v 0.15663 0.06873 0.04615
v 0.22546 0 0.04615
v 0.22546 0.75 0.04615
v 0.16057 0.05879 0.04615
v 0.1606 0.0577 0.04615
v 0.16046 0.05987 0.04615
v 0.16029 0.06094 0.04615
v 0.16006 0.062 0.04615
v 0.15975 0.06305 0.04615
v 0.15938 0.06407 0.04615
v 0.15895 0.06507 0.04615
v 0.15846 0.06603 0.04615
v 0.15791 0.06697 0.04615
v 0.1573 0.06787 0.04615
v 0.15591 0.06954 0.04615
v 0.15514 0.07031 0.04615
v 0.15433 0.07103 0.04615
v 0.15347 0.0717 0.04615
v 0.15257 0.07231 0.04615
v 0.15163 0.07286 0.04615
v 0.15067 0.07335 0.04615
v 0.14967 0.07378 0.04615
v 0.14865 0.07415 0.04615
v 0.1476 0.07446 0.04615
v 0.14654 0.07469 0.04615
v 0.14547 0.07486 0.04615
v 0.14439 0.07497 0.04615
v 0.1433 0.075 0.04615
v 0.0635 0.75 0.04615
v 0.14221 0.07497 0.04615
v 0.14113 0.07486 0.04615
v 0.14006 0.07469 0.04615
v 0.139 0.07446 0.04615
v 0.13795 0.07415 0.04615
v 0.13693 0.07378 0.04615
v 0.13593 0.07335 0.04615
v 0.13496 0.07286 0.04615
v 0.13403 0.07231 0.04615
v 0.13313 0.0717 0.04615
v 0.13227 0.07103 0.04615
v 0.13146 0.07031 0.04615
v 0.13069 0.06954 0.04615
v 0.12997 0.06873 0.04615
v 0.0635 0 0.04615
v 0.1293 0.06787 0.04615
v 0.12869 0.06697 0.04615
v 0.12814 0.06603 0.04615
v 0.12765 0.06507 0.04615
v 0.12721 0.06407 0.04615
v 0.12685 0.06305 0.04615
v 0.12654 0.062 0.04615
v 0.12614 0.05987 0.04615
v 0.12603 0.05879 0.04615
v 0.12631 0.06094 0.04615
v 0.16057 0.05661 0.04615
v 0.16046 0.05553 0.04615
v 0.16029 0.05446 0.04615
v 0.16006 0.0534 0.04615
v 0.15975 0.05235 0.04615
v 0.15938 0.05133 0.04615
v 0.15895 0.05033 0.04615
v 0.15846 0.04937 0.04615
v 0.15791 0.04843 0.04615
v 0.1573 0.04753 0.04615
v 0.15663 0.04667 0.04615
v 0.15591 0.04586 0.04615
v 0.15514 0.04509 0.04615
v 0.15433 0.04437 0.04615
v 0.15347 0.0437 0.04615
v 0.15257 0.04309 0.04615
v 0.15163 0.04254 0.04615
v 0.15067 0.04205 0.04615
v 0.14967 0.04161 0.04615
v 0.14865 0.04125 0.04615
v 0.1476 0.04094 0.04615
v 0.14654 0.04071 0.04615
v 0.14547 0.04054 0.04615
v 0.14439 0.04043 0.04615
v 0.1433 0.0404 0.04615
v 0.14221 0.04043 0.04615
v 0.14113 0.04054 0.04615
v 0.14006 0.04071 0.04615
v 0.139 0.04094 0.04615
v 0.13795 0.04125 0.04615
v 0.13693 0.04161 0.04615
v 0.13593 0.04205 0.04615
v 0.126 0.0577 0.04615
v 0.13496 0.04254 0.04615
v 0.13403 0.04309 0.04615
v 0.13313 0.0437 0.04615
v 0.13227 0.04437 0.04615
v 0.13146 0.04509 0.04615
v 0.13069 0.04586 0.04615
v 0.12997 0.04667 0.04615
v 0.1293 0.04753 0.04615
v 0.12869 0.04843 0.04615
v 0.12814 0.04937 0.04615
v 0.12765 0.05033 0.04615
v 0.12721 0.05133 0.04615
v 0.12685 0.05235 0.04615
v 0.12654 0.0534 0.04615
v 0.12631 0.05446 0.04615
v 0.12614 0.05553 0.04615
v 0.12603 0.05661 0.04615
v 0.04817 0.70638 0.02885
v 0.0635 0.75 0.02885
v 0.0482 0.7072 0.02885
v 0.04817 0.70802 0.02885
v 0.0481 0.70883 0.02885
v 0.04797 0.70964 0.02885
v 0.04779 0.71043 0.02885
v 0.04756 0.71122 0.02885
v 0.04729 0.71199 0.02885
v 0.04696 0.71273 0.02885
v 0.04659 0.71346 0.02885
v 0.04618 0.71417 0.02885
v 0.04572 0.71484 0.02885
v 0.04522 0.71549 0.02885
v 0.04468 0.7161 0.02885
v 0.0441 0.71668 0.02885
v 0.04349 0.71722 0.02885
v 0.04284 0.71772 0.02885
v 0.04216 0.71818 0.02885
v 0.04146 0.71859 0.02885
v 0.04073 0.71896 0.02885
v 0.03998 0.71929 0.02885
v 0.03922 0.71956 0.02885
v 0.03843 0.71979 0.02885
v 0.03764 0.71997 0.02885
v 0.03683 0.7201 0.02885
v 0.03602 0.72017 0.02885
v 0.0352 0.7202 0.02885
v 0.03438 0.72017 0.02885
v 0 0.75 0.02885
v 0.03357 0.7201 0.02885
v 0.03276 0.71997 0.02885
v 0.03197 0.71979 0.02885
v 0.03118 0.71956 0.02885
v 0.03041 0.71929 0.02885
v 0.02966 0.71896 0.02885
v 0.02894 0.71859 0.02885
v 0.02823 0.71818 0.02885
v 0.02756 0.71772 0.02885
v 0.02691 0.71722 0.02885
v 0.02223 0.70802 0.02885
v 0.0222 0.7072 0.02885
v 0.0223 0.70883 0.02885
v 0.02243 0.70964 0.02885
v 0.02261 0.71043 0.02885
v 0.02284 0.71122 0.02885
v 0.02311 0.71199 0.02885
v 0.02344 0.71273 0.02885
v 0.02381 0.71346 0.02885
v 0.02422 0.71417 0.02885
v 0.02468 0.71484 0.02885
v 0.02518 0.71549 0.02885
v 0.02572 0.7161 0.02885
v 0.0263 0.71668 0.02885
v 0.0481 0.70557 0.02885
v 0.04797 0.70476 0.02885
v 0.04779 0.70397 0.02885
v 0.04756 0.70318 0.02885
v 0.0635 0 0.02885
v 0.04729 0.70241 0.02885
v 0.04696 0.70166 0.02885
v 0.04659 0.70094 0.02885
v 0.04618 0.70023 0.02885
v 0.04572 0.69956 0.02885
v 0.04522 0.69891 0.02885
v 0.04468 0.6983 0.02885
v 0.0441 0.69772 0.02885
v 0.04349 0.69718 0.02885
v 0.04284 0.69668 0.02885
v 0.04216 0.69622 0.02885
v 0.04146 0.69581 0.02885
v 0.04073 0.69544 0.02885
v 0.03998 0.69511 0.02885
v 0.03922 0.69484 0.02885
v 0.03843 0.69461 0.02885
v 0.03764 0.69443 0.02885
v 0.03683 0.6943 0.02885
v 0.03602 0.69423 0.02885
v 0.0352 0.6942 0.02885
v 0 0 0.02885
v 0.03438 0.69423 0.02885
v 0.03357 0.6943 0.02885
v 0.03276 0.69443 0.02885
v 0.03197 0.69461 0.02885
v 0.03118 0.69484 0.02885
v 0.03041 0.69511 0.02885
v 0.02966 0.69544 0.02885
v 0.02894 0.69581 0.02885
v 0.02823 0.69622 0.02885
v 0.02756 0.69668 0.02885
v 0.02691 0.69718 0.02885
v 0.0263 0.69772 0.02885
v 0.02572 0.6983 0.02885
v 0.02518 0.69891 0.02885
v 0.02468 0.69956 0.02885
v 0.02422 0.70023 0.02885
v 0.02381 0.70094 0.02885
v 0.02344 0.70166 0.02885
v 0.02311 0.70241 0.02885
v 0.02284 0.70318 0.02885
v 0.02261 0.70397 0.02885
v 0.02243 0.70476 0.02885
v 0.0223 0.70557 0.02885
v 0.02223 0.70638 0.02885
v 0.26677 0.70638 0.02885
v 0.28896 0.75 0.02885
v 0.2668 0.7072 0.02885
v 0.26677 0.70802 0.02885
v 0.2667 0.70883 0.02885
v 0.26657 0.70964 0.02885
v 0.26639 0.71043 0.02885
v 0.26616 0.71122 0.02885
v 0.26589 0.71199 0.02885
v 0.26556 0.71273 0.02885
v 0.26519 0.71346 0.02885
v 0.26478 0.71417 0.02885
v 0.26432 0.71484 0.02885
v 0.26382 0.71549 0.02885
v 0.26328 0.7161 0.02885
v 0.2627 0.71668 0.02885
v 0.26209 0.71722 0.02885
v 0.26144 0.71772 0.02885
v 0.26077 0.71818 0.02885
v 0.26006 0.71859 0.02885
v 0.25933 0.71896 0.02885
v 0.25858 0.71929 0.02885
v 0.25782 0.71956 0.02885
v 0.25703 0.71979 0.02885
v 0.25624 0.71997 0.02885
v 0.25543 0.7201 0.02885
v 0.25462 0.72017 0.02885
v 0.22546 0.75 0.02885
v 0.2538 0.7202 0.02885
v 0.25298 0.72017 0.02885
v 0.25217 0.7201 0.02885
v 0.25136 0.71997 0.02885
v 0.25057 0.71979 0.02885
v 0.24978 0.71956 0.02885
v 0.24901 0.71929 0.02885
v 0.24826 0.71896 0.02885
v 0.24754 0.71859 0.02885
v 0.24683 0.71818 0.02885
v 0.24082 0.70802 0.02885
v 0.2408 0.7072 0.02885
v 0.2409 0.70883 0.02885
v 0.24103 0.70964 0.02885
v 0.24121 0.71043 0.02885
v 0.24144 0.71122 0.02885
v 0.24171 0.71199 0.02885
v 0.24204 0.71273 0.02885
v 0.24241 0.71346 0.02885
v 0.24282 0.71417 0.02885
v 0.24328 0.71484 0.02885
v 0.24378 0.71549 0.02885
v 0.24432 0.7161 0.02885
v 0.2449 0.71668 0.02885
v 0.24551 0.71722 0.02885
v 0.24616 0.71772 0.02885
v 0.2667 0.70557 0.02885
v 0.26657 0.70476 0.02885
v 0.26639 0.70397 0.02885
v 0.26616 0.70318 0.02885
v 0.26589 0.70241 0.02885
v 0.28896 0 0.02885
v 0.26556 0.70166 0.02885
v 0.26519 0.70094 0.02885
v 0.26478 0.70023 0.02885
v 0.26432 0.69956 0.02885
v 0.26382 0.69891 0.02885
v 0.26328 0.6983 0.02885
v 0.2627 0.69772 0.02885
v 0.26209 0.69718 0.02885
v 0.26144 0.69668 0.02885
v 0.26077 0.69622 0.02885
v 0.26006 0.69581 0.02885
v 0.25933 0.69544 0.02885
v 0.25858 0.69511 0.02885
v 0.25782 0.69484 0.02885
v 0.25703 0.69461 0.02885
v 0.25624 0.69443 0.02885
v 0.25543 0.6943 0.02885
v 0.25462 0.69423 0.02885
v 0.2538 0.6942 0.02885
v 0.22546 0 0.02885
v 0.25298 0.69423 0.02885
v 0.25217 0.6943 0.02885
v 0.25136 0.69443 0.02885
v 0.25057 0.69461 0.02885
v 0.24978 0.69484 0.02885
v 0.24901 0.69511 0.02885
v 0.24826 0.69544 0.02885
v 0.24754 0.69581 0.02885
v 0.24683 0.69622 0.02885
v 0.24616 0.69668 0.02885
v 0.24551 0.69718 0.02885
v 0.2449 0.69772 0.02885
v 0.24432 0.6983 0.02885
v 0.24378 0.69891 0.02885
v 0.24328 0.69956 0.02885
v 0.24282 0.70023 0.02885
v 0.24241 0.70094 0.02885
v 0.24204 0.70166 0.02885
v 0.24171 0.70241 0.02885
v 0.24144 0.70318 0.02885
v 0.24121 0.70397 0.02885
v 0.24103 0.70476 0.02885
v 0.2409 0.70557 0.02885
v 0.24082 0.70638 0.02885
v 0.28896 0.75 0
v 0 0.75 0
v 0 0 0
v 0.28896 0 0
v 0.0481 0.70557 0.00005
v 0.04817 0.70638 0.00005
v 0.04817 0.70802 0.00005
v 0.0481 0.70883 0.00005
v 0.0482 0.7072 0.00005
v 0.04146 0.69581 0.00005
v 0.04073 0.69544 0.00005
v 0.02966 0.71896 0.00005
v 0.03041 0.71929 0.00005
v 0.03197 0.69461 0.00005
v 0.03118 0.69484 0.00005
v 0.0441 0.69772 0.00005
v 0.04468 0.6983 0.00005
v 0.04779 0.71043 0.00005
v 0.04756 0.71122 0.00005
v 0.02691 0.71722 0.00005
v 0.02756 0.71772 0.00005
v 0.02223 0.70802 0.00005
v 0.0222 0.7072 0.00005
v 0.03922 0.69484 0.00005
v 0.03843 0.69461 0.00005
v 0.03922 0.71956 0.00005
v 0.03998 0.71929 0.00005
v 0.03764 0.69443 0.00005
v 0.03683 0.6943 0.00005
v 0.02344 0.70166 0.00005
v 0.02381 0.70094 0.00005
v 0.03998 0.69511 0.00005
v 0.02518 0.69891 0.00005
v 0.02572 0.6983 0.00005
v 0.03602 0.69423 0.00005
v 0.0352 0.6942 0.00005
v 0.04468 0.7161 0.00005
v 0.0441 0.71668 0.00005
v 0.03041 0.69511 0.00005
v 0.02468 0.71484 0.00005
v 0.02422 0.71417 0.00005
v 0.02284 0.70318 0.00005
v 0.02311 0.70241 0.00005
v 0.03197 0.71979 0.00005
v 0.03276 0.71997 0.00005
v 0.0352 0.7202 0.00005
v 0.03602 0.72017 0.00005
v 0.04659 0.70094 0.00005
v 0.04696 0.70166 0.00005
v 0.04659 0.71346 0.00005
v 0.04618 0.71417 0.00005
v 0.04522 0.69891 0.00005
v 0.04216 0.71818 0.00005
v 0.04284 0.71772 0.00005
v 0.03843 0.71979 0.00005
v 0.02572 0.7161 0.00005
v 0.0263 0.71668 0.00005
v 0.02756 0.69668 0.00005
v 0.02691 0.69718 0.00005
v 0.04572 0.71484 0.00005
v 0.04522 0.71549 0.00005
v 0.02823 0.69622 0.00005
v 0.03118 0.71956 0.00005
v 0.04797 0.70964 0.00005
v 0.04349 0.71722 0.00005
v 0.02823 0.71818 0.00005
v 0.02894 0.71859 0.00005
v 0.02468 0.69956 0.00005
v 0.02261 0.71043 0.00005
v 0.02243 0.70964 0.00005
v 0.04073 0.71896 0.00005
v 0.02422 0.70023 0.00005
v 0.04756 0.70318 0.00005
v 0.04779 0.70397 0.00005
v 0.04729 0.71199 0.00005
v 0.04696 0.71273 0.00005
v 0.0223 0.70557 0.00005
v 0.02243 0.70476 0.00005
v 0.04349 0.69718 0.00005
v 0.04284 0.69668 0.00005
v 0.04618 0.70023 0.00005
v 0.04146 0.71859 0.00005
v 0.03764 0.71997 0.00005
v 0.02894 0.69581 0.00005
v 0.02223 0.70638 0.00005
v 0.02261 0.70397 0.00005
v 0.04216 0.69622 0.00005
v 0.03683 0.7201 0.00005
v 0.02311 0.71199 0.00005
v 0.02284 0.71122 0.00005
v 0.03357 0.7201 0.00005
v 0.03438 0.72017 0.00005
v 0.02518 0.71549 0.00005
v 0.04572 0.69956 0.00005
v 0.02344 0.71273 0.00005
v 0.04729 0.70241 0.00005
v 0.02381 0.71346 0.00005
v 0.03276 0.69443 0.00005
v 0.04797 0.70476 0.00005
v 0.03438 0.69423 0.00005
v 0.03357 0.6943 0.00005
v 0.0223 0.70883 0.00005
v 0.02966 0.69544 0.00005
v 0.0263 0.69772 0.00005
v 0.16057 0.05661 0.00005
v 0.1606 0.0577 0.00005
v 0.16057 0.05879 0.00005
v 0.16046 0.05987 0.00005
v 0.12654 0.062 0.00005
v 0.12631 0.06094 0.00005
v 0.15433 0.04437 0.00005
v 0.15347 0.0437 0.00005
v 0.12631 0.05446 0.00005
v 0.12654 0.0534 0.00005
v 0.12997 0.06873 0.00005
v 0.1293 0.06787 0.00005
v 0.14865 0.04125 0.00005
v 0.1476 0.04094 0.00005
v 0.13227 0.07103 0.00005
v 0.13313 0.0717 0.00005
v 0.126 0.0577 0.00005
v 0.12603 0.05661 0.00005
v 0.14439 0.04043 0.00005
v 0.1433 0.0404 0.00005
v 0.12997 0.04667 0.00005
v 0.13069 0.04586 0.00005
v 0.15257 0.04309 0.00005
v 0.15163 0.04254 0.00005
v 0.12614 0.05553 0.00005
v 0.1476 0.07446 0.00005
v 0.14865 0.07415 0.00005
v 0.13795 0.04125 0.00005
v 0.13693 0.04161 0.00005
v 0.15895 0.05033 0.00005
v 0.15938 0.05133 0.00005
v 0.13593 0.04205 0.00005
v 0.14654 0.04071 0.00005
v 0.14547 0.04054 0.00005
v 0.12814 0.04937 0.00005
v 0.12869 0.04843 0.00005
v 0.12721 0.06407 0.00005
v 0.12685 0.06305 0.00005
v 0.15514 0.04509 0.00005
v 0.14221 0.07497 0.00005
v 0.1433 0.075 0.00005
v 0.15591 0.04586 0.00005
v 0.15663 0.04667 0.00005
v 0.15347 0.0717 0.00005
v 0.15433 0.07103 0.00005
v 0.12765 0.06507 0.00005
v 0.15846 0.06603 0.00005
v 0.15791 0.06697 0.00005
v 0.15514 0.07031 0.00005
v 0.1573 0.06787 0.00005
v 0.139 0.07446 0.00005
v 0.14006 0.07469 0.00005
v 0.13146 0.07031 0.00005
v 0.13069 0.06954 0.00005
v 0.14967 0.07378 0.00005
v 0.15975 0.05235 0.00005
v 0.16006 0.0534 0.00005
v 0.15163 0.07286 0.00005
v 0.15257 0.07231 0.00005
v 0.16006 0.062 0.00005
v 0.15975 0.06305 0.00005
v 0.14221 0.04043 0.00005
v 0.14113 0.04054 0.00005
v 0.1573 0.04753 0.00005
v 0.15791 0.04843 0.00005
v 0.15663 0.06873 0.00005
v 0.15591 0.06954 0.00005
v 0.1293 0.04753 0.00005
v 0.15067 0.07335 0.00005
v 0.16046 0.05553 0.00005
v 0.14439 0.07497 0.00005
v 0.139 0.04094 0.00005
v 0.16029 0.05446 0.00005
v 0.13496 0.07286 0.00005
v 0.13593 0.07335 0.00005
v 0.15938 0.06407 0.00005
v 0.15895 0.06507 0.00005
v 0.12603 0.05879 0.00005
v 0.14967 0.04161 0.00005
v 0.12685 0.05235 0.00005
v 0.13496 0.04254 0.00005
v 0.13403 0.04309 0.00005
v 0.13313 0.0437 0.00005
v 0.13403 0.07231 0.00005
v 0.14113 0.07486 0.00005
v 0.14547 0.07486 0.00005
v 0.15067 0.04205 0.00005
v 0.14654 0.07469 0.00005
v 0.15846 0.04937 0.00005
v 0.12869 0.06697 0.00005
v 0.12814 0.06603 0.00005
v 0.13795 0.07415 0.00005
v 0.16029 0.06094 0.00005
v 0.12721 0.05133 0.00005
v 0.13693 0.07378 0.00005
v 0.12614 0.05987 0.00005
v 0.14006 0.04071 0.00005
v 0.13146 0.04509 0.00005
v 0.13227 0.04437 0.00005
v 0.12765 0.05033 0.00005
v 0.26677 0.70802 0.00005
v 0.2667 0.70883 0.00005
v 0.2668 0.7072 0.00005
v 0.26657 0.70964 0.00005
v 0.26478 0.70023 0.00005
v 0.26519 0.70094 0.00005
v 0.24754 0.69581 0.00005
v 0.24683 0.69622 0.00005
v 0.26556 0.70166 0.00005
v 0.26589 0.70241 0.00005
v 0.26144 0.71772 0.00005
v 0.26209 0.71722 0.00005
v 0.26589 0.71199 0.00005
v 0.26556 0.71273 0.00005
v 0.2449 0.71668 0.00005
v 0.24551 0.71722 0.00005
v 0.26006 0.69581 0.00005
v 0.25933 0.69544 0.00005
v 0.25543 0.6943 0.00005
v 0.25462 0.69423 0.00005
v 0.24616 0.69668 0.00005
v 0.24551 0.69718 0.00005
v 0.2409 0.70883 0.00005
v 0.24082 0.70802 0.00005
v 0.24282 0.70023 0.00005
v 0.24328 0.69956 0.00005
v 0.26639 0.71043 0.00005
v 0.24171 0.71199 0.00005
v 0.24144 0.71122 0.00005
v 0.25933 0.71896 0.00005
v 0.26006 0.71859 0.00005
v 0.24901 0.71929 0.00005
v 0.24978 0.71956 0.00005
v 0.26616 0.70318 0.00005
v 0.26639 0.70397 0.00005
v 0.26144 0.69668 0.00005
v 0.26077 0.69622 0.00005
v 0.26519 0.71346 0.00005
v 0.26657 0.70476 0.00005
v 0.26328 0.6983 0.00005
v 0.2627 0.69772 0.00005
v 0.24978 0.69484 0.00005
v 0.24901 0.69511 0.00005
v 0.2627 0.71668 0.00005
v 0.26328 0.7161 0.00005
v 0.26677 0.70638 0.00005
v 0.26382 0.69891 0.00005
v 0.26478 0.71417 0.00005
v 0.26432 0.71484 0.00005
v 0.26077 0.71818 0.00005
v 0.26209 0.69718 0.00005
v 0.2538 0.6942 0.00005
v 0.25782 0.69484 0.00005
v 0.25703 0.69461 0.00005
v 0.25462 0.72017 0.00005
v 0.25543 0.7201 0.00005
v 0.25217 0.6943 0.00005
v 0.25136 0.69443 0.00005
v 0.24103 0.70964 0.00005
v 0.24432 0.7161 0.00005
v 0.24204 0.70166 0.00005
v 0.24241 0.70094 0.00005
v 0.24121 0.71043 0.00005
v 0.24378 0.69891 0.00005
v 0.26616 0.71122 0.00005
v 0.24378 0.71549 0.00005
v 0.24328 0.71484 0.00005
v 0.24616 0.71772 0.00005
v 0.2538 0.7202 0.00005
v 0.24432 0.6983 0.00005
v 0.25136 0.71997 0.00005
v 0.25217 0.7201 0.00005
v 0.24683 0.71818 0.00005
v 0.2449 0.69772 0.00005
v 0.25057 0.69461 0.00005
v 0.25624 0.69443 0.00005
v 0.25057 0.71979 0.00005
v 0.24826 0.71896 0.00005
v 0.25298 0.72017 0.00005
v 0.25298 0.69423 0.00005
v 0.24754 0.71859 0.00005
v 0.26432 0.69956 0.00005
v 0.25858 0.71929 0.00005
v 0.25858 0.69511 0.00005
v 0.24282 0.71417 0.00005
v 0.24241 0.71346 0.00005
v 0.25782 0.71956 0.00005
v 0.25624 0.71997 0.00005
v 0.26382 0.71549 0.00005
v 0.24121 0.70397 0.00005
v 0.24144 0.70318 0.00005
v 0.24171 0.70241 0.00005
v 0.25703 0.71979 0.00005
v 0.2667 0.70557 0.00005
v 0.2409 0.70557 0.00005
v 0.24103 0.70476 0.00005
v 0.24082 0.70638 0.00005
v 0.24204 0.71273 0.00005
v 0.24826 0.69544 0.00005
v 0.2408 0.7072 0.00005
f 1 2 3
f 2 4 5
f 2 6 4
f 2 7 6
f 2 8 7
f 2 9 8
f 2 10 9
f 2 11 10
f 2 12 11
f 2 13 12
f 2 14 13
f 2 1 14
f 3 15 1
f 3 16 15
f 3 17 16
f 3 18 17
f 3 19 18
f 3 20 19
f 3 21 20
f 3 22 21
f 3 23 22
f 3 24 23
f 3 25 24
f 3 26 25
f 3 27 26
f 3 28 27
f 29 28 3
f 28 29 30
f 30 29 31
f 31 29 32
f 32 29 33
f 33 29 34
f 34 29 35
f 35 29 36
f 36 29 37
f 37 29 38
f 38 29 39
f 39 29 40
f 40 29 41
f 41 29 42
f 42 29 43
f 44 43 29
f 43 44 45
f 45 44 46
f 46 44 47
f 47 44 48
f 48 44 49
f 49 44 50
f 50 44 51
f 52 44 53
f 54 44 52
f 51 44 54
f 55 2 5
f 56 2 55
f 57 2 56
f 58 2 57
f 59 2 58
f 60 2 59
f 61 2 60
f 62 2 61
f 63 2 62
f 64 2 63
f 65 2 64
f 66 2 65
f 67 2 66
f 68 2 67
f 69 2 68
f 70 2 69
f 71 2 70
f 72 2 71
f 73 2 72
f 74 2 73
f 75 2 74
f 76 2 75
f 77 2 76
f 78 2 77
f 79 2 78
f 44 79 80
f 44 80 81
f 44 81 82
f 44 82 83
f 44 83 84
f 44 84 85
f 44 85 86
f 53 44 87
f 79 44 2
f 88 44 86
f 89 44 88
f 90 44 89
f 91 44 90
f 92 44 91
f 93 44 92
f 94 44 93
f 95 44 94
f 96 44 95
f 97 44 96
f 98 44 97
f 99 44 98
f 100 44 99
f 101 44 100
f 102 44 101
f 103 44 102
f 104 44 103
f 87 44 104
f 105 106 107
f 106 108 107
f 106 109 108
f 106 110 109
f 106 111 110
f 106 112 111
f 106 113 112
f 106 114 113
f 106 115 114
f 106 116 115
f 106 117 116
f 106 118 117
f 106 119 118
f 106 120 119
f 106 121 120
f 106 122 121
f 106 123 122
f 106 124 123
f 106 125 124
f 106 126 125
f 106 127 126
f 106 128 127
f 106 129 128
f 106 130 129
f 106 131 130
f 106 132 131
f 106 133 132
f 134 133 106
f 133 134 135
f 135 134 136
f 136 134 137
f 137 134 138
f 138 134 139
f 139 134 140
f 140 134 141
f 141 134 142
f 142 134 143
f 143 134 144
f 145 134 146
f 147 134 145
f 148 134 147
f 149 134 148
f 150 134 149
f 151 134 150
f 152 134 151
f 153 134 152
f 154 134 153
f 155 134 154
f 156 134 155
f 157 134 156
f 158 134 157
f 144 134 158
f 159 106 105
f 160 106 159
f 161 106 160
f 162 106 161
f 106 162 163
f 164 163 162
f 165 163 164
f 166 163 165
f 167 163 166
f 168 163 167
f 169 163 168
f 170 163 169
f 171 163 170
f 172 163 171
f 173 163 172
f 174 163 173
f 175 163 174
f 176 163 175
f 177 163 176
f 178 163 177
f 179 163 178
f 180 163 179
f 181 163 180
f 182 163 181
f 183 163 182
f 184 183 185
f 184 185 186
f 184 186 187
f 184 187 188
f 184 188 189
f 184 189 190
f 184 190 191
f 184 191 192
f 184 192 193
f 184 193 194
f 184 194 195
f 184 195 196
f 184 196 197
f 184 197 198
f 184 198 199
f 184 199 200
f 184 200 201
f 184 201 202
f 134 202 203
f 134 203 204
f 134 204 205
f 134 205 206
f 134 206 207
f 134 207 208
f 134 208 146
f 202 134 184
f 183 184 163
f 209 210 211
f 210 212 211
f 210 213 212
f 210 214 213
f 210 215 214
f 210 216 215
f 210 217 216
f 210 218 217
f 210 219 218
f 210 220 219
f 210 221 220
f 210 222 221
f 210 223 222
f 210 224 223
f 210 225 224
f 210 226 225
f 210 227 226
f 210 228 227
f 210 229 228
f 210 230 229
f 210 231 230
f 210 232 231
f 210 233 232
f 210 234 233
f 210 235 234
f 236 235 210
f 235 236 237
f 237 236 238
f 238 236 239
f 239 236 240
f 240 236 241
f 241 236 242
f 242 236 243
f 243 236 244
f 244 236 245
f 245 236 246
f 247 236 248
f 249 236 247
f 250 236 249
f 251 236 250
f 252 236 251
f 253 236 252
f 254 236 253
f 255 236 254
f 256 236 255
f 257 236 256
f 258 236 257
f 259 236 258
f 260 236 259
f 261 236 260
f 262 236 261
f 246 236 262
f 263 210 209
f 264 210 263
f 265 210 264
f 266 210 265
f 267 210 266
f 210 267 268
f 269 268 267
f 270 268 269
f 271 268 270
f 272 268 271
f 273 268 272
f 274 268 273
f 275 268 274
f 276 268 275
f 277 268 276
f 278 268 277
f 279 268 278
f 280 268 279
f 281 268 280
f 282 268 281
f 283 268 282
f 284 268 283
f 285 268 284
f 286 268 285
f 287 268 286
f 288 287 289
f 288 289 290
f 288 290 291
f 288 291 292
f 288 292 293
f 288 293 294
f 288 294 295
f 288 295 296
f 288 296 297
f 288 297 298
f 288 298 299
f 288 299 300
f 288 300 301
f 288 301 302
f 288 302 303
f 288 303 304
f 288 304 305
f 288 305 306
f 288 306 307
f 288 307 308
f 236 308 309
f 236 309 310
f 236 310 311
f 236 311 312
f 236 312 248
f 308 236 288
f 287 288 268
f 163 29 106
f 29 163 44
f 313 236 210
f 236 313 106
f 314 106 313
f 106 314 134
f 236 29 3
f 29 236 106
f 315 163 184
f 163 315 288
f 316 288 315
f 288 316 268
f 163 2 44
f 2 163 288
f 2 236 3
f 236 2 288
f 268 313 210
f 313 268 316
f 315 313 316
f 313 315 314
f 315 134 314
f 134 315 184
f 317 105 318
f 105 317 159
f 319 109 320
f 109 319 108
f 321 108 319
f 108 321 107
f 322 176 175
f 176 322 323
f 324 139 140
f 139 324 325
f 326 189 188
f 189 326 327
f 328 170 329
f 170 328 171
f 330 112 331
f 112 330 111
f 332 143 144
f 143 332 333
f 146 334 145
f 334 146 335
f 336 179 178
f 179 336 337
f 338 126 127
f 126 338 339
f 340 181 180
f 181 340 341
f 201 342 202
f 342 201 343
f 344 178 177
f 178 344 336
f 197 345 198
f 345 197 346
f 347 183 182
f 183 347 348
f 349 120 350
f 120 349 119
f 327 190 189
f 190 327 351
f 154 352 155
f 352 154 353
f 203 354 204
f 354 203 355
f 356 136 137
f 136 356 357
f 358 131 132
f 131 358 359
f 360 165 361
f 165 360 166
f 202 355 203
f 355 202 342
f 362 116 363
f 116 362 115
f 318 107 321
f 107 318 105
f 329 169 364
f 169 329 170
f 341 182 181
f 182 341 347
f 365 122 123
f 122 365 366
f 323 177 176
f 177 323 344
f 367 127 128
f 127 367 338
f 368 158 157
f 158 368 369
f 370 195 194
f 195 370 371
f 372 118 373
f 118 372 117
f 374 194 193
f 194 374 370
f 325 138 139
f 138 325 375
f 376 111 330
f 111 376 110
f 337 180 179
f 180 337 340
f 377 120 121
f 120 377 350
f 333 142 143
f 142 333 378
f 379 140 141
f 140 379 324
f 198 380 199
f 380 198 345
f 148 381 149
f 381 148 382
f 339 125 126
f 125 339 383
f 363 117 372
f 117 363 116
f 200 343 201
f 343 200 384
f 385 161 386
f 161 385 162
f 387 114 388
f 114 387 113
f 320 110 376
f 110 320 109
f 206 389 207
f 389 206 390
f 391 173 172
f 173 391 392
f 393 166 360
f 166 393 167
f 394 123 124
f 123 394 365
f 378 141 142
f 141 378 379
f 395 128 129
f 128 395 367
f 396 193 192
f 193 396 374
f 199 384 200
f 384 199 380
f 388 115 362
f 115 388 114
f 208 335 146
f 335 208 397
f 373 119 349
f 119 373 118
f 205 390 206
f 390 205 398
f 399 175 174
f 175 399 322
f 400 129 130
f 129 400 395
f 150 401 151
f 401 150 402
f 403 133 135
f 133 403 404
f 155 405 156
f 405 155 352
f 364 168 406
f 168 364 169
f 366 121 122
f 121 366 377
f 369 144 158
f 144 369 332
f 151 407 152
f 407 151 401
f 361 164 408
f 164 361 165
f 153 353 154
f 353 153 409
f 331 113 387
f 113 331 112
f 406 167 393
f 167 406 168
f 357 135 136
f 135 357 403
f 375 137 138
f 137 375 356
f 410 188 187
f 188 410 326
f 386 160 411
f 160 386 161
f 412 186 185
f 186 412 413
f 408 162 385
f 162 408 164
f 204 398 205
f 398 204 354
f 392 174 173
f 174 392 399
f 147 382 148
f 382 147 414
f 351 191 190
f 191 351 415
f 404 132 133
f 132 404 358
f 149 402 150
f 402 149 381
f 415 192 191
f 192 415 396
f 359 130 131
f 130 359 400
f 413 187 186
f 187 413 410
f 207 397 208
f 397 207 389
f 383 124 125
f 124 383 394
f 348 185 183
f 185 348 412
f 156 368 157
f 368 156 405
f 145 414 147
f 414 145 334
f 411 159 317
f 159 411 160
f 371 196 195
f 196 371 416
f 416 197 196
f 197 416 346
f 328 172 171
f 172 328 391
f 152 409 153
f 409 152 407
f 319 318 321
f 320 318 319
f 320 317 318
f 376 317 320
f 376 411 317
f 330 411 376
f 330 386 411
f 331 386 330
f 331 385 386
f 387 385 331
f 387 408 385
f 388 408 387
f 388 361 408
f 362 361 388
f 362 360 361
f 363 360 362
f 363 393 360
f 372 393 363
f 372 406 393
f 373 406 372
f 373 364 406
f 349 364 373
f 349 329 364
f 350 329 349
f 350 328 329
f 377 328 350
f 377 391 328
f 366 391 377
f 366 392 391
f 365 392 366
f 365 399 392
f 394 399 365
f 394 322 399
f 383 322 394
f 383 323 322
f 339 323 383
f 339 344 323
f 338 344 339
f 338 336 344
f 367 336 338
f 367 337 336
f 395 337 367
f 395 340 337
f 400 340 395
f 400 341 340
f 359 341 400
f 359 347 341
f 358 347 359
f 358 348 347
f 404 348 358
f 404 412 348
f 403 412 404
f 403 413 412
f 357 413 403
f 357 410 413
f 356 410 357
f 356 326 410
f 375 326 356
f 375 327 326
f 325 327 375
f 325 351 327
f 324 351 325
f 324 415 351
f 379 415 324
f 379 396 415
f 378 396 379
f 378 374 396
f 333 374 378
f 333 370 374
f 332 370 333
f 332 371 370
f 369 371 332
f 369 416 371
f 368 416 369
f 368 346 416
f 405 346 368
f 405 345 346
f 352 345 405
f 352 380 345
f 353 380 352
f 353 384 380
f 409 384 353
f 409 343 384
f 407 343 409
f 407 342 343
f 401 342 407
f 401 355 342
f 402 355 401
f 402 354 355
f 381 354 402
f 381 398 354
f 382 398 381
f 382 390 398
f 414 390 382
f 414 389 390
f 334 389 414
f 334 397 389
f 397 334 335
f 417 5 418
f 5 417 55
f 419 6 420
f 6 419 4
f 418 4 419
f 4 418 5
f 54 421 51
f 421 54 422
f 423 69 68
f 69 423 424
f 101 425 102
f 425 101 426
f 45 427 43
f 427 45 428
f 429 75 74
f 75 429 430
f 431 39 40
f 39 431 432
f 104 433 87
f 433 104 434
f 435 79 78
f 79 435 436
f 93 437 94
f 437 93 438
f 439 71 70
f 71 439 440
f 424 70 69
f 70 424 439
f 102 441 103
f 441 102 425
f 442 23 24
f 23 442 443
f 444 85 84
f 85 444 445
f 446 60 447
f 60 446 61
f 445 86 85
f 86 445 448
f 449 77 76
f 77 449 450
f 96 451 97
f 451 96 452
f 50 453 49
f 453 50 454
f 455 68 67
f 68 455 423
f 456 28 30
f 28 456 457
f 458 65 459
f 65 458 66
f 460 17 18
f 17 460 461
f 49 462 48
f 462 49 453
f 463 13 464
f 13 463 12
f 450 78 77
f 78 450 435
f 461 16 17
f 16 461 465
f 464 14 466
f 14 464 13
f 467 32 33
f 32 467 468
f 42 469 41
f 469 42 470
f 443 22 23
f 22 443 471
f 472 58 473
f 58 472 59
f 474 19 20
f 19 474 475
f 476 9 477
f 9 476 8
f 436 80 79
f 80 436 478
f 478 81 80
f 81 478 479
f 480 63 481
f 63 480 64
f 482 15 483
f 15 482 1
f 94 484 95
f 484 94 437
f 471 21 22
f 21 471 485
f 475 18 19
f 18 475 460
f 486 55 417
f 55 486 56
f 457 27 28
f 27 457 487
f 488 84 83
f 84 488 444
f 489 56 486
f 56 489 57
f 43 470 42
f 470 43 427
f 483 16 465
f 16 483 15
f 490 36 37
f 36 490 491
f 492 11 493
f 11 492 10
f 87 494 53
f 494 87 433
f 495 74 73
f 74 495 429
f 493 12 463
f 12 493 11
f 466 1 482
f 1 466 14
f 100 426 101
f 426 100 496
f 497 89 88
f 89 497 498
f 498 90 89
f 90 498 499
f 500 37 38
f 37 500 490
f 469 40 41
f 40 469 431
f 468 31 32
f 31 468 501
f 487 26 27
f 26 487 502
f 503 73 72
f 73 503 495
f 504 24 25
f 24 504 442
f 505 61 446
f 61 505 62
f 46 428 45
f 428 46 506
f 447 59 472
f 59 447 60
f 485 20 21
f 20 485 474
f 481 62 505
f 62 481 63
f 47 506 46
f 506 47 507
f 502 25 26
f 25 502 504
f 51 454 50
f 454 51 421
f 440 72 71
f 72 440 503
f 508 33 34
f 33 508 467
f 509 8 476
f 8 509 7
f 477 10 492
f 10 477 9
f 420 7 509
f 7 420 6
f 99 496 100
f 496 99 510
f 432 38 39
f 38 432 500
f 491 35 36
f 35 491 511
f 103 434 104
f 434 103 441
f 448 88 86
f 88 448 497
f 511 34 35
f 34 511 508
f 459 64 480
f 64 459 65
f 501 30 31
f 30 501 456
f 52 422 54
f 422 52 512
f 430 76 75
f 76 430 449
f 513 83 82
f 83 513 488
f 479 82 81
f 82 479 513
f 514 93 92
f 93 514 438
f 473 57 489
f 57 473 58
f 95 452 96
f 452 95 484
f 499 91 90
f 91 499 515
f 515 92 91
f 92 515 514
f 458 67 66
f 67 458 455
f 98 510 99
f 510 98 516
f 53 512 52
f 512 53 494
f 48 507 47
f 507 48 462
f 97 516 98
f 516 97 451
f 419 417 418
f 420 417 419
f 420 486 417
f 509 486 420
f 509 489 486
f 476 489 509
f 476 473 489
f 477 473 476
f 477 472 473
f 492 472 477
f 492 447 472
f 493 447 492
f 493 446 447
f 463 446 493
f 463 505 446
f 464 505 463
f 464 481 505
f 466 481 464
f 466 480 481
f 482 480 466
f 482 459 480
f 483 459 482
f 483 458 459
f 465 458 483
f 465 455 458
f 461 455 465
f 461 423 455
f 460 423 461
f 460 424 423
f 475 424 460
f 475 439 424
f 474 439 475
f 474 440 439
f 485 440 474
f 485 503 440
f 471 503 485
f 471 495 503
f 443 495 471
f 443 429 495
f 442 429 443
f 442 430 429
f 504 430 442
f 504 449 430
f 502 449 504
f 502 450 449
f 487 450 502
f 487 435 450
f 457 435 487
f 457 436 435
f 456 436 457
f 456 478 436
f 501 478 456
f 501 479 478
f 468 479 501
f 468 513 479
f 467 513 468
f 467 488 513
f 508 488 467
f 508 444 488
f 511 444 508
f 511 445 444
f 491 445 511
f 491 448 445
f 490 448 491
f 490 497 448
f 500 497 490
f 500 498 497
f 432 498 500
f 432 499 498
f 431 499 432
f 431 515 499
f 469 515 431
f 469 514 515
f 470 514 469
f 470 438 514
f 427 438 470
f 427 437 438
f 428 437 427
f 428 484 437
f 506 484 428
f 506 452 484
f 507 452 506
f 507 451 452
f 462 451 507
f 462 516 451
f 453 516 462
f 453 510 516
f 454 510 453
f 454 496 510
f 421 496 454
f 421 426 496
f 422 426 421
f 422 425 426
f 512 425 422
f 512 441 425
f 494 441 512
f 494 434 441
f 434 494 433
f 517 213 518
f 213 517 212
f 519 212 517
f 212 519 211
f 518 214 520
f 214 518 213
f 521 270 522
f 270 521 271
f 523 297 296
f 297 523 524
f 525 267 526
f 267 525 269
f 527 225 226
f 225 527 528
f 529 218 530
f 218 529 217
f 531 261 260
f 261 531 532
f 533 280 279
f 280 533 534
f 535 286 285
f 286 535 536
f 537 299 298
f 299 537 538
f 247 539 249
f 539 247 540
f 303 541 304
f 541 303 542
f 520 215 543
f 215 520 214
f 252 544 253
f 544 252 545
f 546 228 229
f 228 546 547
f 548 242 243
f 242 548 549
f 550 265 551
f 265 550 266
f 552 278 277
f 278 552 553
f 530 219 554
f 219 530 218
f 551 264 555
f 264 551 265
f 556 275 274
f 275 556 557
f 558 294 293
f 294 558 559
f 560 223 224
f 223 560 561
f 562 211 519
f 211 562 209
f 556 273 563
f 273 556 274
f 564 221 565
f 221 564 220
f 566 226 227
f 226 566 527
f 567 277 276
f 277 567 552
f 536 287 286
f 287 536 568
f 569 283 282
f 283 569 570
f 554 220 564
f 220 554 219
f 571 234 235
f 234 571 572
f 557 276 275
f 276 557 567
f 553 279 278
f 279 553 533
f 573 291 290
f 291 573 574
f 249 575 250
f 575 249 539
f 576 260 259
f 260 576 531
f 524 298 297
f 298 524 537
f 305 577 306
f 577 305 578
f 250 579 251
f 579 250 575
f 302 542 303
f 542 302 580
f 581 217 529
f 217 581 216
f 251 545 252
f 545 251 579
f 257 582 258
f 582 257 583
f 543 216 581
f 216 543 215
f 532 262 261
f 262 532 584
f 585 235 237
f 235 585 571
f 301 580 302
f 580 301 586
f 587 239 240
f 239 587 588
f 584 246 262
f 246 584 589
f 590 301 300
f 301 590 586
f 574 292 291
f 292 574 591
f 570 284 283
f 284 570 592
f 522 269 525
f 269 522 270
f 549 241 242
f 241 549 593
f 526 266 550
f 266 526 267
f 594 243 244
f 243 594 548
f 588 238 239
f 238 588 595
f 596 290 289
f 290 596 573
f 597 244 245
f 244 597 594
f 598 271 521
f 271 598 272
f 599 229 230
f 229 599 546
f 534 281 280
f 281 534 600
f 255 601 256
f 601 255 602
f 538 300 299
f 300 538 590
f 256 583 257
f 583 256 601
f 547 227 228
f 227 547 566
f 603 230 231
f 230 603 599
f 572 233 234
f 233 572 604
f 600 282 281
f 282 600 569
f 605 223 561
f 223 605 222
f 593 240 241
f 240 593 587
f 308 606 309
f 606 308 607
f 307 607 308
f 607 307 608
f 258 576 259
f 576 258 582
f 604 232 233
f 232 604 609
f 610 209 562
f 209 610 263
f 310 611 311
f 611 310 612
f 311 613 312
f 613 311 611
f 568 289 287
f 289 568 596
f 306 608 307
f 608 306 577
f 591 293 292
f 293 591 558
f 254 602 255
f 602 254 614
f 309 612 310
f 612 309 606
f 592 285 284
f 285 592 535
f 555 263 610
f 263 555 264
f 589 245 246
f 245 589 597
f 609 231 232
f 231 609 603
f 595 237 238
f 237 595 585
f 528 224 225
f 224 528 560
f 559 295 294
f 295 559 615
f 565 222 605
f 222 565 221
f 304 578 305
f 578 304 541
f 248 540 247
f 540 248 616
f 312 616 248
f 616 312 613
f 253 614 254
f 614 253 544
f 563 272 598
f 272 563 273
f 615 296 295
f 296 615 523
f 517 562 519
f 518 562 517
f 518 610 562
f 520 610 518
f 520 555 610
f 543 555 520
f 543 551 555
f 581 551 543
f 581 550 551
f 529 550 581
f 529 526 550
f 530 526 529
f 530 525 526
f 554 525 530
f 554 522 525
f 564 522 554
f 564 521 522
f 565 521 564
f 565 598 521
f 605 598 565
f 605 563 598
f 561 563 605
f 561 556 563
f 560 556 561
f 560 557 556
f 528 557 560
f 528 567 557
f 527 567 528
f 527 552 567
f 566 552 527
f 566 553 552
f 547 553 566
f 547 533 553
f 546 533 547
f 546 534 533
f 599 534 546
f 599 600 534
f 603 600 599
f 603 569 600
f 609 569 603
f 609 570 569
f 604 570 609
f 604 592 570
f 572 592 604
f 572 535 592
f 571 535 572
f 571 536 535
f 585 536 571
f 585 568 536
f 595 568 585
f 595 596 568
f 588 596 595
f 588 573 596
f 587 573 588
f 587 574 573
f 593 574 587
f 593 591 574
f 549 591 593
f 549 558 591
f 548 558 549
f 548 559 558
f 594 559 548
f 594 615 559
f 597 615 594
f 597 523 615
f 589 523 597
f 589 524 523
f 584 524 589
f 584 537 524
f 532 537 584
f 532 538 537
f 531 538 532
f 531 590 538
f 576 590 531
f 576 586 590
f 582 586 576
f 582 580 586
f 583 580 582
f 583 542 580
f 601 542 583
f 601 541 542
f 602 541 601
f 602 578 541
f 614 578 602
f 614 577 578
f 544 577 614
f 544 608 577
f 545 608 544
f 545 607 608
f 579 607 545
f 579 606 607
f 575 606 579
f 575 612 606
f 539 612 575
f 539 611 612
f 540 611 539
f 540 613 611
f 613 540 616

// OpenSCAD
// Parametric Dimensions
base_length = 0.28896;
base_width = 0.75;
base_height = 0.028846;
rib_footprint = 0.162037;
rib_edge_offset = 0.0635;
rib_height = 0.017308;
rib_depth = 0.0173;
upper_recess_start = 0.0057;
upper_recess_end = 0.0288;
upper_recess_depth = 0.0231;
deeper_cut_start = 0.0288;
deeper_cut_end = -0.1154;
deeper_cut_depth = 0.1442;

// Hole positions: [left_offset, front_offset, radius]
hole_positions = [
    [0.0352, 0.7072, 0.013],
    [0.1433, 0.0577, 0.0173],
    [0.2538, 0.7072, 0.013]
];

$fn = 100; // Smooth curves

// Base solid
module base_solid() {
    cube([base_length, base_width, base_height]);
}

// Two lengthwise ribs on upper face
module ribs() {
    // Calculate rib width from footprint and edge offsets
    total_rib_space = base_length - 2 * rib_edge_offset;
    rib_width = (rib_footprint - (total_rib_space - rib_footprint)) / 2;
    
    // Left rib
    translate([rib_edge_offset, 0, base_height])
        cube([rib_width, base_width, rib_height]);
    
    // Right rib
    translate([base_length - rib_edge_offset - rib_width, 0, base_height])
        cube([rib_width, base_width, rib_height]);
}

// Stepped circular removed features
module stepped_holes() {
    for (pos = hole_positions) {
        left = pos[0];
        front = pos[1];
        radius = pos[2];
        
        // Upper circular recess stage
        translate([left, front, base_height - upper_recess_start])
            cylinder(h = upper_recess_depth, r = radius);
        
        // Deeper aligned circular cut stage
        translate([left, front, base_height - deeper_cut_start])
            cylinder(h = deeper_cut_depth, r = radius);
    }
}

// Main assembly
difference() {
    union() {
        base_solid();
        ribs();
    }
    stepped_holes();
}
